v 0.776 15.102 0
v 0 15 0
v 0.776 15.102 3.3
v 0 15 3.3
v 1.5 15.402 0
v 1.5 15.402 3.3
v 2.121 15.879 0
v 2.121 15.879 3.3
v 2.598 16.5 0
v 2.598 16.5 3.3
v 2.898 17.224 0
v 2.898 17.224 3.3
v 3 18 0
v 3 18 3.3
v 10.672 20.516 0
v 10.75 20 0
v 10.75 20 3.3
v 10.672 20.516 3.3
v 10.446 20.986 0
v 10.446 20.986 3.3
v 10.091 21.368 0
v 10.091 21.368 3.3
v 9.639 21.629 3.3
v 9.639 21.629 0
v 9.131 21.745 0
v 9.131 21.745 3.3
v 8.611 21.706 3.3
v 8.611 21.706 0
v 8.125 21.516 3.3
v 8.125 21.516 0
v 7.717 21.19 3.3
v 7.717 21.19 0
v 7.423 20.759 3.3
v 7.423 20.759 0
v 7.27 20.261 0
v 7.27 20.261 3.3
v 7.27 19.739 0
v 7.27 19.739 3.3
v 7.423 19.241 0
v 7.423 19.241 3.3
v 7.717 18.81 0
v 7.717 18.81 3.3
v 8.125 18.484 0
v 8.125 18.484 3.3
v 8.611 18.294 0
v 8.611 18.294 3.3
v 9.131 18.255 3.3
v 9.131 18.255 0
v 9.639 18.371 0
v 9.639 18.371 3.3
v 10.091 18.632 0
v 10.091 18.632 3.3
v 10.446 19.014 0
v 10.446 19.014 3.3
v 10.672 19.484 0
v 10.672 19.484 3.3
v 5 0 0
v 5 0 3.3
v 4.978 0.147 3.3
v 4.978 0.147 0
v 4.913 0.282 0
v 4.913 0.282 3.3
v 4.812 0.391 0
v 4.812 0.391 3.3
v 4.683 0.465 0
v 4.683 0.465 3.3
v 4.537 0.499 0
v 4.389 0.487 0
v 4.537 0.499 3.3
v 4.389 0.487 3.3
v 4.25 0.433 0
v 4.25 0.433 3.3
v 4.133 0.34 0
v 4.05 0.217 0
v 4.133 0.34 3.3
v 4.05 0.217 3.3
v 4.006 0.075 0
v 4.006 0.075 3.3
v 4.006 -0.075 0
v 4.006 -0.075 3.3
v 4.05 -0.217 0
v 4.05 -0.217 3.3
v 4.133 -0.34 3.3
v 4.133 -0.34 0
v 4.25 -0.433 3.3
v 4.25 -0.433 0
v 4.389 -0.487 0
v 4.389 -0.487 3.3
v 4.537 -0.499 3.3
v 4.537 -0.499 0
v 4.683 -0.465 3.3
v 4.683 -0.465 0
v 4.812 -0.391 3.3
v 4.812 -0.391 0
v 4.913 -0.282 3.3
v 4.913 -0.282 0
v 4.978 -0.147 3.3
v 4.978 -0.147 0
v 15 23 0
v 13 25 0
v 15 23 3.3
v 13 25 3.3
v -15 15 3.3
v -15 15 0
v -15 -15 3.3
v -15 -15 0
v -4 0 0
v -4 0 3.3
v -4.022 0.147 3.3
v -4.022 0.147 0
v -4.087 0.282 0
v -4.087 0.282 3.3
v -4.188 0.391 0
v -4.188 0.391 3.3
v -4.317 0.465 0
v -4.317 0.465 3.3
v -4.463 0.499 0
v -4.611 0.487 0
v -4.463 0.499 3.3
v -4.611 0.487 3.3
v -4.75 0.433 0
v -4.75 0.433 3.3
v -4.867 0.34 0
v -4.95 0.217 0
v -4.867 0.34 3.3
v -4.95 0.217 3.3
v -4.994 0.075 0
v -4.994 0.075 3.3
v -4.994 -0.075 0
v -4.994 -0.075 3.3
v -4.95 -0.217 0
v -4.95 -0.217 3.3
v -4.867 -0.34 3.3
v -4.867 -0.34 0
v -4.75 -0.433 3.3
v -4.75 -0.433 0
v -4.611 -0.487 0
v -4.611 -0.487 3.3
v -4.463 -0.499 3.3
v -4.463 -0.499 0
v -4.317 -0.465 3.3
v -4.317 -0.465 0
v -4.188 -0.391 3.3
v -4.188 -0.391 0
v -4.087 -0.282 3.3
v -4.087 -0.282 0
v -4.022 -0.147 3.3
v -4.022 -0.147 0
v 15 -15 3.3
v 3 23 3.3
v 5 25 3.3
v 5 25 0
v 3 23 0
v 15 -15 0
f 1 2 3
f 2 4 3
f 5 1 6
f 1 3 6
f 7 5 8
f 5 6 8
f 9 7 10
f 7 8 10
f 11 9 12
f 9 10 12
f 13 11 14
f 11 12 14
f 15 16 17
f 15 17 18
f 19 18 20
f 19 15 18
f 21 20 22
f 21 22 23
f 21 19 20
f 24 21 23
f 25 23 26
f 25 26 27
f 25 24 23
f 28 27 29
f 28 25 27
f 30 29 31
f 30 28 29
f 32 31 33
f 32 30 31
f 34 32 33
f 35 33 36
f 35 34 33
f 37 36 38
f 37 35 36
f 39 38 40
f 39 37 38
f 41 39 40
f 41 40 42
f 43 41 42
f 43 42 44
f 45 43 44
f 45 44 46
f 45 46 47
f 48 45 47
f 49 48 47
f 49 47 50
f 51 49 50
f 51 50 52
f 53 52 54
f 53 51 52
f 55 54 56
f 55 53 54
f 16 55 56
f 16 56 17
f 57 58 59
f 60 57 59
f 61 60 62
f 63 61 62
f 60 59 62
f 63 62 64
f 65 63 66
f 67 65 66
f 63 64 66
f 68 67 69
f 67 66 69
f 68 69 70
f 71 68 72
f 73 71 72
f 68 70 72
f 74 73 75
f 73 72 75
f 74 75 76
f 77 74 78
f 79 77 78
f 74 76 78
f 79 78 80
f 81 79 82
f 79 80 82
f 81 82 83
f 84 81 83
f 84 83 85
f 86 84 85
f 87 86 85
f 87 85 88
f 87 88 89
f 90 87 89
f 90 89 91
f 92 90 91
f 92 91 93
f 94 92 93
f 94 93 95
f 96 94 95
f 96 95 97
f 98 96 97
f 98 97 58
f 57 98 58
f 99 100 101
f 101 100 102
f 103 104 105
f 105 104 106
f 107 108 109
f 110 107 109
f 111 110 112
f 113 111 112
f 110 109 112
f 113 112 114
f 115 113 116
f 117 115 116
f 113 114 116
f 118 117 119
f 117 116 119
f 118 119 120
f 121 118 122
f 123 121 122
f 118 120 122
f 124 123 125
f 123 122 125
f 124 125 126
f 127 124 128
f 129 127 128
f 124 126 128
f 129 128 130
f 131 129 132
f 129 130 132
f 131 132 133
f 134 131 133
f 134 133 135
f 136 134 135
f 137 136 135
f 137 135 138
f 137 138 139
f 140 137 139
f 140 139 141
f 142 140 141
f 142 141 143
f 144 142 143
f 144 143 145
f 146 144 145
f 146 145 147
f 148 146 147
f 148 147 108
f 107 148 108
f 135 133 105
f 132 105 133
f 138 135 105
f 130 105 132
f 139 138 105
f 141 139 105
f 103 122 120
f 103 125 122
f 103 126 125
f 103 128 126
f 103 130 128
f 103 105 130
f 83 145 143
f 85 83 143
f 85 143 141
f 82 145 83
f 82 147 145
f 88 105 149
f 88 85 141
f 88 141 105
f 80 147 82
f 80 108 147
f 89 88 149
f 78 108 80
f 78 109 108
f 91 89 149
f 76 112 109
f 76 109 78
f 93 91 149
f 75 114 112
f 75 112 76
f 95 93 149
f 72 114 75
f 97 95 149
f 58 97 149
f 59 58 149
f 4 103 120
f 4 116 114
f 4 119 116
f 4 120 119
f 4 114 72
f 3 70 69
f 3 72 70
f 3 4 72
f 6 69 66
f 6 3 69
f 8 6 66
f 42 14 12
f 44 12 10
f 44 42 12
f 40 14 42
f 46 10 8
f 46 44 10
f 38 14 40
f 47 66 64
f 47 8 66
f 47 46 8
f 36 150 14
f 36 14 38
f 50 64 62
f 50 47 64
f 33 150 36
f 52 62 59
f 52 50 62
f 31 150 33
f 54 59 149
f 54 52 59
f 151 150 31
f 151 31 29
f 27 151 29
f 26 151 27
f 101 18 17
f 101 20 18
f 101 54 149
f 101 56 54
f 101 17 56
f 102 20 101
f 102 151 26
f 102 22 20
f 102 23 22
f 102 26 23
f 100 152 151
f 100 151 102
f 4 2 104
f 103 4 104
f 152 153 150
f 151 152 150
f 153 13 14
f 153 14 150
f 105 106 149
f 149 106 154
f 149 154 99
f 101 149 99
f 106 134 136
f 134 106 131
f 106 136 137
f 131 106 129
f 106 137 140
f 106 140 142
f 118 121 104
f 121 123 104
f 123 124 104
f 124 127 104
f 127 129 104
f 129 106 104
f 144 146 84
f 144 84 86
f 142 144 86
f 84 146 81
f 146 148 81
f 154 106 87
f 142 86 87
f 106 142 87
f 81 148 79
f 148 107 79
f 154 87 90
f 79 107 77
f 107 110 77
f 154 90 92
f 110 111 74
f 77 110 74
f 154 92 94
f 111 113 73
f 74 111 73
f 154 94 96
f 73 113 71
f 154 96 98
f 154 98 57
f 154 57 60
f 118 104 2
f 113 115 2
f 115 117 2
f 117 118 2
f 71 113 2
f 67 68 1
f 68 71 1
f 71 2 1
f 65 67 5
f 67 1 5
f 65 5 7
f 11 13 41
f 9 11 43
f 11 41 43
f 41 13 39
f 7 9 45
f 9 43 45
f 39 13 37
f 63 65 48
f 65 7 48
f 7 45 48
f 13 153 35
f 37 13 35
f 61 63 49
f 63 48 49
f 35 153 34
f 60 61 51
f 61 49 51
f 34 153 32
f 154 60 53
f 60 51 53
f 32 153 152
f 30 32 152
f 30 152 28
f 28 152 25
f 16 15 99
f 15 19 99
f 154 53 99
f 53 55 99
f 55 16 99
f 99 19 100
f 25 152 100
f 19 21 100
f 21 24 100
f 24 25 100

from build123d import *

# Parameters (mm, degrees)
F0_W     = 12
F0_H     = 10
F0_R     = 1.75
F1_DEPTH = 3.3
F2_SIZE  = 2
F3_R     = 3
F4_R     = 0.5
F5_DEPTH = 25


with BuildPart() as f1:
    # F0 (on Top) → F1 (new body)
    with BuildSketch(Plane.XY):
        Polygon((15, -15), (15, 15), (3, 15), (-15, 15), (-15, -15), align=None)
        with Locations((9, 20)):
            Rectangle(F0_W, F0_H)
        with Locations((9, 20)):
            Circle(F0_R, mode=Mode.SUBTRACT)
    extrude(amount=F1_DEPTH)

    # F2
    f2_edges = [f1.edges().sort_by_distance(p)[0] for p in [
        (3, 25, 1.65),
        (15, 25, 1.65),
    ]]
    chamfer(f2_edges, length=F2_SIZE)

    # F3
    f3_edges = [f1.edges().sort_by_distance(p)[0] for p in [
        (3, 15, 1.65),
    ]]
    fillet(f3_edges, radius=F3_R)

    # F4 (on face) → F5 (cut)
    with BuildSketch(Plane.XY.offset(3.3)):
        with Locations((-4.5, 0)):
            Circle(F4_R)
        with Locations((4.5, 0)):
            Circle(F4_R)
    extrude(amount=-F5_DEPTH, mode=Mode.SUBTRACT)


solid = f1.part
